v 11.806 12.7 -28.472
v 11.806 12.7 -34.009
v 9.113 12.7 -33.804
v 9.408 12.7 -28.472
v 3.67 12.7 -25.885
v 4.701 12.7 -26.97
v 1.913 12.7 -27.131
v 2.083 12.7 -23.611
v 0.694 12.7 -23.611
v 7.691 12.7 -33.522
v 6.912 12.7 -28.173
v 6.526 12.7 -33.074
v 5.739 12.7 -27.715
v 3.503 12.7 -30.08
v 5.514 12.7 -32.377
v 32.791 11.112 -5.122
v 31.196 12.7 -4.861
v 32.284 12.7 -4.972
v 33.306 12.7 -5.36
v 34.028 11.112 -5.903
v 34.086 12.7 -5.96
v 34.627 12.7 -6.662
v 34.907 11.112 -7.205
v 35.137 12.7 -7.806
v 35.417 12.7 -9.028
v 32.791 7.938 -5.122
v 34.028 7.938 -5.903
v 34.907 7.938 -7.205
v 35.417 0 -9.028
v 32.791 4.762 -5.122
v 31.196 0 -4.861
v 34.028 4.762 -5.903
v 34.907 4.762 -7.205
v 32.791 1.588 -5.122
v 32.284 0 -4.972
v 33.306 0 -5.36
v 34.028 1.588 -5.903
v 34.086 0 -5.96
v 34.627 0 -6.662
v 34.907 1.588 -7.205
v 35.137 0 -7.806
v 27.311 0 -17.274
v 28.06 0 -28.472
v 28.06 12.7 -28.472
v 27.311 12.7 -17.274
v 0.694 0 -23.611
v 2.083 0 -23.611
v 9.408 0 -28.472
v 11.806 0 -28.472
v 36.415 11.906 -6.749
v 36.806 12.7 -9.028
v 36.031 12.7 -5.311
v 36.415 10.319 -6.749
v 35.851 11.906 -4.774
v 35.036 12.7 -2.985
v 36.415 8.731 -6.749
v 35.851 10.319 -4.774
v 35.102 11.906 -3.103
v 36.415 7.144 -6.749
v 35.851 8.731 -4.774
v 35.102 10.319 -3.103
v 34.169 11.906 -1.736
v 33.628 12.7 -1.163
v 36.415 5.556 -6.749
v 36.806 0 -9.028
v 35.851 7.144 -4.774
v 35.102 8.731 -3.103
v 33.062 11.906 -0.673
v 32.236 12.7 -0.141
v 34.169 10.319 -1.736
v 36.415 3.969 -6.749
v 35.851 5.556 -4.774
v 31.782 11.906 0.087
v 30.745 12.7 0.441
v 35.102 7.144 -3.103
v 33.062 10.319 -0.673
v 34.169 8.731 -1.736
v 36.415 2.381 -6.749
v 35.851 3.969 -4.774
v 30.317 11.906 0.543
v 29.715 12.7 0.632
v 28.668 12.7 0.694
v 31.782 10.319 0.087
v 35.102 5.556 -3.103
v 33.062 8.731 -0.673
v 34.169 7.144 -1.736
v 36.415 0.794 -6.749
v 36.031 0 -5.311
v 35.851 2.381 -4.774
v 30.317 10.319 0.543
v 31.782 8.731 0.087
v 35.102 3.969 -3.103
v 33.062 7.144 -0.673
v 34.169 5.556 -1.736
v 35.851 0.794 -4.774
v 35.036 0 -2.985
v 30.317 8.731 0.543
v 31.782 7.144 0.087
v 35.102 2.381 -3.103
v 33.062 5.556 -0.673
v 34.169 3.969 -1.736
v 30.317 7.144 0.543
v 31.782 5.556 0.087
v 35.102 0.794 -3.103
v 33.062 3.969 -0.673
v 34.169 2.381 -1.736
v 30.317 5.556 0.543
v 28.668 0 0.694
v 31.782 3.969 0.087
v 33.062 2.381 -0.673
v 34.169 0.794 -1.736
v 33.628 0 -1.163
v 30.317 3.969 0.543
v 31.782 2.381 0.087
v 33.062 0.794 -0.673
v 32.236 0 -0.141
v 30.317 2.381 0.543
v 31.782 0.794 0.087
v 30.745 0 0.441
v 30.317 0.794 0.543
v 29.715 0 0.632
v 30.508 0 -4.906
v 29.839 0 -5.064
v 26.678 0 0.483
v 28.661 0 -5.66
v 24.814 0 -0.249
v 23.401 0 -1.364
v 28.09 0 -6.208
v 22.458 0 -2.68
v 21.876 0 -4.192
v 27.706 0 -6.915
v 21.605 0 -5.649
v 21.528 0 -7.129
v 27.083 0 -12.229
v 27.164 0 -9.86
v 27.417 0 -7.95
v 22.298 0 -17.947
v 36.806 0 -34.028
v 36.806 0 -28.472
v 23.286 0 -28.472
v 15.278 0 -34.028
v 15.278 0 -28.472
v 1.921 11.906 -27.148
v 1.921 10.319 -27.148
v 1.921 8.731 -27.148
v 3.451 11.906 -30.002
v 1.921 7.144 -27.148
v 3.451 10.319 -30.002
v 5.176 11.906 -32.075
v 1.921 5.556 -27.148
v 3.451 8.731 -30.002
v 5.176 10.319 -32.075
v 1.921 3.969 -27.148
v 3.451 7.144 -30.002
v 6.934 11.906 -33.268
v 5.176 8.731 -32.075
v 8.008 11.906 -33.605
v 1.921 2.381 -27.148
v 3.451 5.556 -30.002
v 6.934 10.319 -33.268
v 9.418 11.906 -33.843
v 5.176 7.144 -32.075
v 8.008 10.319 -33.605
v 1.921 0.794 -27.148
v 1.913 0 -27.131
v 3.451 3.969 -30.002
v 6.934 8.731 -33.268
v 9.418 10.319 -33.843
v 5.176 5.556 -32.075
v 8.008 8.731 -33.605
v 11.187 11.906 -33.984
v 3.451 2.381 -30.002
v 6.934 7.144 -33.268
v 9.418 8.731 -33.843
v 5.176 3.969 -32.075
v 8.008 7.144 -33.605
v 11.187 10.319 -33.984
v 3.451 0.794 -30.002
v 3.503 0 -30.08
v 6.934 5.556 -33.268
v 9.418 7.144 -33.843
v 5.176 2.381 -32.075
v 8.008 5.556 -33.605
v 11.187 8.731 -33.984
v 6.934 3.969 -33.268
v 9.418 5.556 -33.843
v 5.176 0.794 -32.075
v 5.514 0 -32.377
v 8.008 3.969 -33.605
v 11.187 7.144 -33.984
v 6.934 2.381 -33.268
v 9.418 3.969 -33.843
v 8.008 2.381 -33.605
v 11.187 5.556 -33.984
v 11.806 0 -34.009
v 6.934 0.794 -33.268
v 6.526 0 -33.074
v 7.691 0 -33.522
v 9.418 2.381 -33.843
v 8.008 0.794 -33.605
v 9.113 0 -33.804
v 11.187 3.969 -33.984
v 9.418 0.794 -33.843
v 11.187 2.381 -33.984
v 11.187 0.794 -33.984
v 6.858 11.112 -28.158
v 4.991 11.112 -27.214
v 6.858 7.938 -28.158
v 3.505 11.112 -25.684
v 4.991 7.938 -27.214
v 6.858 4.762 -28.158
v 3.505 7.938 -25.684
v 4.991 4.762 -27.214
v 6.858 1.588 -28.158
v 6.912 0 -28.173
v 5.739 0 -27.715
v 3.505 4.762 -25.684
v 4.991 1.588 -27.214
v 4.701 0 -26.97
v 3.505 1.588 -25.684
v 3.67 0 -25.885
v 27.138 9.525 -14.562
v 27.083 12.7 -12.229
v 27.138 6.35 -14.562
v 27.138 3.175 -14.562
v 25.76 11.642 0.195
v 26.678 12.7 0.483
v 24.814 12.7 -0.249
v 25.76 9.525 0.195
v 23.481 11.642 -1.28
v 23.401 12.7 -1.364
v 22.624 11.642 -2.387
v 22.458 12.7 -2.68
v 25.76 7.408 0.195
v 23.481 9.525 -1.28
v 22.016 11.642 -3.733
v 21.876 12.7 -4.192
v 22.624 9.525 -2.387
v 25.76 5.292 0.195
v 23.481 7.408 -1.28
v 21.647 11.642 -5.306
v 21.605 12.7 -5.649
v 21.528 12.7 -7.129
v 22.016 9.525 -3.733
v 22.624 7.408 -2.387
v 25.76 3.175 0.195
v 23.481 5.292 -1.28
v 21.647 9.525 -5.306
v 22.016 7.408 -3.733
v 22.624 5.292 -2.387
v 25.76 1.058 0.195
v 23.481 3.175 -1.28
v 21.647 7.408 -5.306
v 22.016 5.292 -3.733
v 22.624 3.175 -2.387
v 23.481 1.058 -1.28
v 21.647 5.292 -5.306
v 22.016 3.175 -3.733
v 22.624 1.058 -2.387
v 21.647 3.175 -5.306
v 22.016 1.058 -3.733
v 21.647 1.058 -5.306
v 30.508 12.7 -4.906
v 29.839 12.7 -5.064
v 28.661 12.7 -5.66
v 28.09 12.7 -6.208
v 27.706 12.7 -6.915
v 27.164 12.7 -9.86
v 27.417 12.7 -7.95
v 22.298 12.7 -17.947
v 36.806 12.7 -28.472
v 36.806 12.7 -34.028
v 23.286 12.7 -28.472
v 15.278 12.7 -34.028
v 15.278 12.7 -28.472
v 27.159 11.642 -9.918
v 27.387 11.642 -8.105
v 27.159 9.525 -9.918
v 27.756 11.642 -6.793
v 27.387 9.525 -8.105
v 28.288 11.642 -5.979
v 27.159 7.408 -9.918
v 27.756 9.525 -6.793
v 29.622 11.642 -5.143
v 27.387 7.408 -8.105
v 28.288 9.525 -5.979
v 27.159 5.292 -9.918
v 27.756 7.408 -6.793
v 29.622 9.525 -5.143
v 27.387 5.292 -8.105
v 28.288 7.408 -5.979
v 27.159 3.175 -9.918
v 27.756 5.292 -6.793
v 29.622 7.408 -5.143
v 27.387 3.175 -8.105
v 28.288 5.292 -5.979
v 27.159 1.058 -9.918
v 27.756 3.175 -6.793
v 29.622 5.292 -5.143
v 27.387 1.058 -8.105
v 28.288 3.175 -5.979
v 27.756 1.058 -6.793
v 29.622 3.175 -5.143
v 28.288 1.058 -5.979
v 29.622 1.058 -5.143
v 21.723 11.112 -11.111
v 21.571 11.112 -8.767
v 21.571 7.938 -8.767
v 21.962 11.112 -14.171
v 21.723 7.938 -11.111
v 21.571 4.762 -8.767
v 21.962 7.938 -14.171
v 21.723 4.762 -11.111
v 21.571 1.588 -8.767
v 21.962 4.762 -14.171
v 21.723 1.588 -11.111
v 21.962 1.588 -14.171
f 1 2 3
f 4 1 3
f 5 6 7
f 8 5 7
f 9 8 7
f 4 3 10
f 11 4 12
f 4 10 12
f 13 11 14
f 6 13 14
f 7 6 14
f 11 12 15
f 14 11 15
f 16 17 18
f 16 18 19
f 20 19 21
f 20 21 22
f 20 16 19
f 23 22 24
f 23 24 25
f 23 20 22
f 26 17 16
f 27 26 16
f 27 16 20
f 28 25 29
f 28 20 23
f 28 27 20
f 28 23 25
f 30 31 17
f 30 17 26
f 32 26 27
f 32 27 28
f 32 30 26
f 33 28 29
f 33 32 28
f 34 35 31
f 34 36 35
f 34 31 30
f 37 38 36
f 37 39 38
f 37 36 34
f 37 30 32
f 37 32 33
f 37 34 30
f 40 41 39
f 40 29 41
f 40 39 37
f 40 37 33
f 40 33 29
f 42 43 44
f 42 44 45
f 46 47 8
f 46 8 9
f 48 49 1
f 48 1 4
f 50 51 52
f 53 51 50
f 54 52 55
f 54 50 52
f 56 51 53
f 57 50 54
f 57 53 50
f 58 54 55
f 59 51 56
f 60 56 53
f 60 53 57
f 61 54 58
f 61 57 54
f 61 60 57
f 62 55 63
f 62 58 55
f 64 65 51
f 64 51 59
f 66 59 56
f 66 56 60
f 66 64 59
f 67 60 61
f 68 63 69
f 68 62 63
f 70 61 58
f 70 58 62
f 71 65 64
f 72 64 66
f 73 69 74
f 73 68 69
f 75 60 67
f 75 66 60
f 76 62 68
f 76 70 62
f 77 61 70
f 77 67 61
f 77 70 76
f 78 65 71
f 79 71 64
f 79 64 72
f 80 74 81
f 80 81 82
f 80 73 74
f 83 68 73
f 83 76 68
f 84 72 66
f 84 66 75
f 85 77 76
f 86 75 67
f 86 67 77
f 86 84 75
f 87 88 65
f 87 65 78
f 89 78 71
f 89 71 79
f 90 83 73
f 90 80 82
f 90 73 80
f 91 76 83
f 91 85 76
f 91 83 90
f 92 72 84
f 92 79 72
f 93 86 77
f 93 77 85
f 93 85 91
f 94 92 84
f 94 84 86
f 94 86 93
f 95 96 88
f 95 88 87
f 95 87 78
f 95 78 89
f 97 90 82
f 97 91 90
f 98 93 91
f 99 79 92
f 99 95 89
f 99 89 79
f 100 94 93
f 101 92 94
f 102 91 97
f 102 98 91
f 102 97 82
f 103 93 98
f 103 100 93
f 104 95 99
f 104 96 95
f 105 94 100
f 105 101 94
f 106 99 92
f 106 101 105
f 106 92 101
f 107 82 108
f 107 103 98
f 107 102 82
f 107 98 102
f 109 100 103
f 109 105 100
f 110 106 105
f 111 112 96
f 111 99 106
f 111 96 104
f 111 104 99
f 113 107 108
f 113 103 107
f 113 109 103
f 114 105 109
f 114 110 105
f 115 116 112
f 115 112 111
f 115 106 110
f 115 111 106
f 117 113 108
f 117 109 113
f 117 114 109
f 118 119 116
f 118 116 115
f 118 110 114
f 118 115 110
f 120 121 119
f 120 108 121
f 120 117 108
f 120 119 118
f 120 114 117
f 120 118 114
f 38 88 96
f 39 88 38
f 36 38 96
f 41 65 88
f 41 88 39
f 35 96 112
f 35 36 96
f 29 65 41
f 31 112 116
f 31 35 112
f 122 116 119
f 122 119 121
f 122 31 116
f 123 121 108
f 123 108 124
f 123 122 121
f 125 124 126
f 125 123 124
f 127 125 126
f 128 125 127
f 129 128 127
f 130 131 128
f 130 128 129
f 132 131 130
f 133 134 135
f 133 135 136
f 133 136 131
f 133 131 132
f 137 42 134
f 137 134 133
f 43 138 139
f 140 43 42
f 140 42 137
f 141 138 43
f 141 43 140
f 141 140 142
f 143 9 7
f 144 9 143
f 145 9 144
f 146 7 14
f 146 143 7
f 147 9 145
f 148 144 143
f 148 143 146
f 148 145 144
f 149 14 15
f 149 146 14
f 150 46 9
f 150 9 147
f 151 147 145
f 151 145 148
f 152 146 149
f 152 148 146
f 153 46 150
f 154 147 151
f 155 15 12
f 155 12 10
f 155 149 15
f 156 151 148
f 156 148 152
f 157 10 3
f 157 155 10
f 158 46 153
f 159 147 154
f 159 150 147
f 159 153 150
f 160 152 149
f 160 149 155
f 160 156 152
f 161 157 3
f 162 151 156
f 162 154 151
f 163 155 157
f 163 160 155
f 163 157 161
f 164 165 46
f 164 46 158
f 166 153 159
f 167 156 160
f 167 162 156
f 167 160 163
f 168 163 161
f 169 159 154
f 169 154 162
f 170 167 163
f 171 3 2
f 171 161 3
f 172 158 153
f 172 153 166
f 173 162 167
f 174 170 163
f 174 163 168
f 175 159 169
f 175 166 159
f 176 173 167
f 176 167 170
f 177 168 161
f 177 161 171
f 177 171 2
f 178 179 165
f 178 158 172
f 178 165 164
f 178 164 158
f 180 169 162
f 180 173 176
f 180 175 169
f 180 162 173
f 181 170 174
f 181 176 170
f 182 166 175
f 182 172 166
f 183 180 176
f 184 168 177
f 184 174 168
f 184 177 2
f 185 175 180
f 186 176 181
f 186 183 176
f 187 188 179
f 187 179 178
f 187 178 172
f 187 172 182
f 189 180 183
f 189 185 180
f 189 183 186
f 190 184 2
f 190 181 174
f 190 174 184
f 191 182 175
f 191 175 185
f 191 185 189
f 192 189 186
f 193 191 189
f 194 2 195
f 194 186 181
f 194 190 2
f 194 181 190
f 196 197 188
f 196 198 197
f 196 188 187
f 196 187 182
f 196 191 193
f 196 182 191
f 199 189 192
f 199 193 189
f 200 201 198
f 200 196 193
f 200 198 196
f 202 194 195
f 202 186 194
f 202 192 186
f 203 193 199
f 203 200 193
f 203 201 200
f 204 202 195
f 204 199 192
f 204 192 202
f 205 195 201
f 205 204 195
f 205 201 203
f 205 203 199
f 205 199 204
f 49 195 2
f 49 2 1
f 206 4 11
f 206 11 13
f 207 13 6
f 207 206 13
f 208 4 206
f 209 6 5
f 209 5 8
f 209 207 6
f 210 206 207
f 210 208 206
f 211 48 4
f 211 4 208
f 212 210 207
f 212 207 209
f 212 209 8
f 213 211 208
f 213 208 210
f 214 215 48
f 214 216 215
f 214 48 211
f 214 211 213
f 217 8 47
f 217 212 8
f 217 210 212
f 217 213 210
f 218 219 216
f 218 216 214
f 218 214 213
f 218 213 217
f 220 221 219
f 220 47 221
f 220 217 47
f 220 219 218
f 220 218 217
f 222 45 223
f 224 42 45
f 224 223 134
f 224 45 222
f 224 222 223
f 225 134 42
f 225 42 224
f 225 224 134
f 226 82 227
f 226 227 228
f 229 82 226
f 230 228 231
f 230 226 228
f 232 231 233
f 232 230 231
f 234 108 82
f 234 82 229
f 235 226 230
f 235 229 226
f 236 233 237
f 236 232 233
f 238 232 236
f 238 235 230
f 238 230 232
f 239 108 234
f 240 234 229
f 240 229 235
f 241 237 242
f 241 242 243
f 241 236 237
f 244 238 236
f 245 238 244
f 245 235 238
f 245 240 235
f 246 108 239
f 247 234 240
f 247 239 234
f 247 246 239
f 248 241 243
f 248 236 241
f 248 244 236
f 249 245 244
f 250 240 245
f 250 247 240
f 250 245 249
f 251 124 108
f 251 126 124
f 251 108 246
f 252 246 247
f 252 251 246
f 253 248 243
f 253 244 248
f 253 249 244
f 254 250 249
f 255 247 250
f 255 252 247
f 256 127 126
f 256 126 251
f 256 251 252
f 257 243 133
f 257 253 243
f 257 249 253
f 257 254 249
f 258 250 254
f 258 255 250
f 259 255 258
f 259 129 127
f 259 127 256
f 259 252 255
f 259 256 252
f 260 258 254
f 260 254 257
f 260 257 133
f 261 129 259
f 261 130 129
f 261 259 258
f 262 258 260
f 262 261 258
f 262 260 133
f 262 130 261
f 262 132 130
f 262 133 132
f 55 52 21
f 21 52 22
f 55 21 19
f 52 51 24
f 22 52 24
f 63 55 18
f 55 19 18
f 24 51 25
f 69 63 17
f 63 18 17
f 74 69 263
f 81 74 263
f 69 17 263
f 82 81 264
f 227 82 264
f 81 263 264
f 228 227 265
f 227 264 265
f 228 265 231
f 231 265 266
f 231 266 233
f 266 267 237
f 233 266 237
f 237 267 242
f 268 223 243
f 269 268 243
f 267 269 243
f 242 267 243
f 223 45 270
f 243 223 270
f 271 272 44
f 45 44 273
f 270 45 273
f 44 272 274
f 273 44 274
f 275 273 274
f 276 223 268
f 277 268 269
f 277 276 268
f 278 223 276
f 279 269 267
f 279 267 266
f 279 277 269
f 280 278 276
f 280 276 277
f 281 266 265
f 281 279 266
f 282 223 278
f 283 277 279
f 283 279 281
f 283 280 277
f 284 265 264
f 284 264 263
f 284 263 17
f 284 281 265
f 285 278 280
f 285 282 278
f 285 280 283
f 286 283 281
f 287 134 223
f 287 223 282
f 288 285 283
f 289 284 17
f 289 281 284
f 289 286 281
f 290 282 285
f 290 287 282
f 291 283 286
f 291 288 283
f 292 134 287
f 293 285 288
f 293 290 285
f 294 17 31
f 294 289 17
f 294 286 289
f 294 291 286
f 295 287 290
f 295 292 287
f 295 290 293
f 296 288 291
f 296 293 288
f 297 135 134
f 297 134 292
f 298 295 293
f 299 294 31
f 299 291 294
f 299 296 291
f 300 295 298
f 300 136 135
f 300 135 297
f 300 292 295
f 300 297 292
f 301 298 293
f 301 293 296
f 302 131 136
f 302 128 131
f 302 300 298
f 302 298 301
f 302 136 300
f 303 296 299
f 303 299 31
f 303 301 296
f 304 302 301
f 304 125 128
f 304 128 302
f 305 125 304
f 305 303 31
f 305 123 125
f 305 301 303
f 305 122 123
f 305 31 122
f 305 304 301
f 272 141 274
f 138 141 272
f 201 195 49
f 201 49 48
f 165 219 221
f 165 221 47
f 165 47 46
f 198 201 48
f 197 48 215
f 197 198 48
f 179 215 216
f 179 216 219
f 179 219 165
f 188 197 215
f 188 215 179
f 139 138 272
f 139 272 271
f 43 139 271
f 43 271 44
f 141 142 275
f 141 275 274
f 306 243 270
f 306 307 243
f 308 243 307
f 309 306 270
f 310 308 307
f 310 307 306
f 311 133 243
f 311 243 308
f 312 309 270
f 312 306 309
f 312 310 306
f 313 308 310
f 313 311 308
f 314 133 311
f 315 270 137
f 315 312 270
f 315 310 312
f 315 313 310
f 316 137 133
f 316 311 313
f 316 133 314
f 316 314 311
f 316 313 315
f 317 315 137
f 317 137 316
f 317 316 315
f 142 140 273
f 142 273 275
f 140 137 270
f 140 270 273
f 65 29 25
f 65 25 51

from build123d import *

# Parameters (mm, degrees)
BOSS_EXTRUDE1_DEPTH     = 12.7
CUT_EXTRUDE2_DEPTH      = 52.709076543
CUT_EXTRUDE2_DEPTH_BACK = 12.7


with BuildPart() as part:
    # Sketch2 → Boss-Extrude1 (new body)
    with BuildSketch(Plane(origin=(0, 0, 0), x_dir=(1, 0, 0), z_dir=(0, 1, 0))):
        with BuildLine():
            Line((36.805555556, 34.027777778), (36.805555556, 28.472222222))
            Line((36.805555556, 28.472222222), (28.059895833, 28.472222222))
            Line((28.059895833, 28.472222222), (27.311197917, 17.274305556))
            add(Edge.make_bspline(
                [(27.311197917, 17.274305556), (27.277795656, 16.804166639), (27.213581874, 15.900353642), (27.134284285, 14.591279231), (27.088344823, 13.379251723), (27.084956214, 12.601307574), (27.083333333, 12.228732639)],
                knots=[0, 0, 0, 0, 1.119532368, 2.152231754, 3.115062263, 4, 4, 4, 4], degree=3))
            add(Edge.make_bspline(
                [(27.083333333, 12.228732639), (27.088274581, 11.823604319), (27.097676522, 11.052747972), (27.1463749, 9.958919939), (27.245170271, 8.988755862), (27.371002693, 8.143926135), (27.529152233, 7.419430528), (27.728457334, 6.818301639), (27.97650636, 6.339464464), (28.352227221, 5.878445418), (28.902546694, 5.47047021), (29.612022333, 5.12581616), (30.381545964, 4.888099058), (30.919027092, 4.870283408), (31.195746528, 4.861111111)],
                knots=[0, 0, 0, 0, 1.508120221, 2.869569927, 4.073906796, 5.136392291, 6.047624064, 6.831039609, 7.487569696, 8.042672177, 9.031004047, 10.006413578, 10.97361213, 12, 12, 12, 12], degree=3))
            add(Edge.make_bspline(
                [(31.195746528, 4.861111111), (31.47916585, 4.872136088), (32.020929674, 4.893210634), (32.788220791, 5.094099051), (33.466107529, 5.423211567), (34.05259416, 5.891325855), (34.548953998, 6.488400226), (34.936220725, 7.22238631), (35.244986398, 8.076473761), (35.357486114, 8.699850181), (35.416666667, 9.027777778)],
                knots=[0, 0, 0, 0, 1.033647866, 1.975846305, 2.874029418, 3.767535477, 4.696297243, 5.689637366, 6.784632136, 8, 8, 8, 8], degree=3))
            Line((35.416666667, 9.027777778), (36.805555556, 9.027777778))
            add(Edge.make_bspline(
                [(36.805555556, 9.027777778), (36.751313392, 8.636593642), (36.645430641, 7.872987448), (36.430993277, 6.771079076), (36.1666915, 5.743505172), (35.873825885, 4.788096172), (35.503638642, 3.918308722), (35.126438428, 3.108890157), (34.67022236, 2.39005292), (34.190460036, 1.734735752), (33.64770155, 1.167708505), (33.078282467, 0.661363985), (32.447526517, 0.251271838), (31.785619175, -0.107880779), (31.064059185, -0.356214557), (30.308826122, -0.563500536), (29.502063403, -0.664205141), (28.949843487, -0.684214933), (28.667534722, -0.694444444)],
                knots=[0, 0, 0, 0, 1.346490984, 2.628401203, 3.824883511, 4.963792231, 6.031069444, 7.045970716, 8.004214277, 8.929182016, 9.810359102, 10.675861826, 11.520733207, 12.370272421, 13.236390006, 14.115839292, 15.03676947, 16, 16, 16, 16], degree=3))
            add(Edge.make_bspline(
                [(28.667534722, -0.694444444), (28.154682861, -0.675816782), (27.164131243, -0.639838242), (25.766335044, -0.242024901), (24.512145619, 0.369174112), (23.621609051, 1.101026149), (23.010255911, 1.797210882), (22.609852371, 2.383817061), (22.268478936, 3.030858971), (22.003101082, 3.740487332), (21.782965902, 4.501315843), (21.632459475, 5.322642072), (21.547875637, 6.204798769), (21.53462541, 6.814049436), (21.527777778, 7.12890625)],
                knots=[0, 0, 0, 0, 1.53176672, 2.958542455, 4.314758716, 5.68491526, 6.375705814, 7.084681483, 7.806528549, 8.560798466, 9.349284224, 10.175616502, 11.057170379, 12, 12, 12, 12], degree=3))
            add(Edge.make_bspline(
                [(21.527777778, 7.12890625), (21.530511411, 7.37125412), (21.536674087, 7.917600965), (21.569321673, 8.825873224), (21.639359606, 9.910585643), (21.725996598, 11.172904628), (21.834635018, 12.612456183), (21.96658957, 14.232690848), (22.114735136, 16.030968586), (22.235168036, 17.288909187), (22.298177083, 17.947048611)],
                knots=[0, 0, 0, 0, 0.536190643, 1.208783333, 2.010417809, 2.94084931, 4.00811323, 5.204264869, 6.537304937, 8, 8, 8, 8], degree=3))
            Line((22.298177083, 17.947048611), (23.285590278, 28.472222222))
            Line((23.285590278, 28.472222222), (15.277777778, 28.472222222))
            add(Edge.make_bspline(
                [(15.277777778, 28.472222222), (15.214460278, 27.401507925), (15.092072877, 25.331907254), (14.886109564, 22.340596723), (14.670777515, 19.573381685), (14.442846588, 17.030553937), (14.208342944, 14.71137929), (13.954506302, 12.617981517), (13.715610292, 10.74508508), (13.436521107, 9.086740026), (13.164846669, 7.602952782), (12.886850841, 6.270387957), (12.590238795, 5.07441313), (12.303899426, 4.011159992), (12.003972777, 3.085637953), (11.686744628, 2.301603715), (11.378814424, 1.642404725), (10.958043065, 0.964152103), (10.358101863, 0.292051075), (9.505081424, -0.285187523), (8.526340218, -0.641645855), (7.833640049, -0.676470824), (7.476128472, -0.694444444)],
                knots=[0, 0, 0, 0, 2.01044623, 3.886023449, 5.620111306, 7.212895615, 8.671360263, 9.989066837, 11.16552434, 12.209857215, 13.140654073, 13.99296191, 14.760845937, 15.449993852, 16.056713946, 16.582946555, 17.034739681, 17.418487115, 18.076100987, 18.706013306, 19.33215662, 20, 20, 20, 20], degree=3))
            add(Edge.make_bspline(
                [(7.476128472, -0.694444444), (7.207412809, -0.681627697), (6.681489385, -0.656543087), (5.927311086, -0.469815134), (5.234803565, -0.159026243), (4.623769653, 0.271526397), (4.10585267, 0.797998542), (3.737602188, 1.427988796), (3.515453468, 2.133829731), (3.486861324, 2.631486012), (3.472222222, 2.886284722)],
                knots=[0, 0, 0, 0, 1.073515936, 2.101057932, 3.084730514, 4.091615775, 5.073373561, 6.013242394, 6.982785322, 8, 8, 8, 8], degree=3))
            add(Edge.make_bspline(
                [(3.472222222, 2.886284722), (3.49977796, 3.167601475), (3.56174898, 3.800264126), (3.975195909, 4.785596558), (4.58793497, 5.912424554), (5.130000946, 6.671771181), (5.425347222, 7.085503472)],
                knots=[0, 0, 0, 0, 0.719350384, 1.617771125, 2.702035439, 4, 4, 4, 4], degree=3))
            add(Edge.make_bspline(
                [(5.425347222, 7.085503472), (5.880890291, 7.733268934), (6.778468477, 9.009592048), (7.924062056, 11.019134082), (8.912809694, 13.051591024), (9.583491505, 14.814505434), (10.052627408, 16.316401679), (10.355193153, 17.603017915), (10.666713374, 19.033013262), (10.926646603, 20.624922957), (11.194761694, 22.366552488), (11.410609585, 24.268277428), (11.637107009, 26.317618199), (11.748122743, 27.737606389), (11.805555556, 28.472222222)],
                knots=[0, 0, 0, 0, 1.256859471, 2.476450027, 3.668368903, 4.842737386, 5.467680022, 6.165560467, 6.940549266, 7.791280764, 8.726175375, 9.738470097, 10.830021485, 12, 12, 12, 12], degree=3))
            Line((11.805555556, 28.472222222), (9.407552083, 28.472222222))
            add(Edge.make_bspline(
                [(9.407552083, 28.472222222), (8.954085196, 28.460620671), (8.094301289, 28.438623856), (6.890732805, 28.196638527), (5.842130851, 27.81794011), (4.969568852, 27.229936528), (4.197964836, 26.514921386), (3.47646424, 25.663099106), (2.739413588, 24.704465568), (2.307624449, 23.984891132), (2.083333333, 23.611111111)],
                knots=[0, 0, 0, 0, 1.164670171, 2.208242094, 3.144640406, 4.011598175, 4.893941805, 5.843464191, 6.879796223, 8, 8, 8, 8], degree=3))
            Line((2.083333333, 23.611111111), (0.694444444, 23.611111111))
            add(Edge.make_bspline(
                [(0.694444444, 23.611111111), (0.877085401, 24.232597394), (1.229291, 25.431074191), (1.886266978, 27.119888333), (2.60411942, 28.642568556), (3.40397479, 29.980706486), (4.259111756, 31.115981615), (5.118517845, 32.058955597), (5.996672541, 32.785861584), (6.772590288, 33.224850634), (7.449074281, 33.455523285), (8.027104125, 33.619326955), (8.696031334, 33.743397524), (9.444623844, 33.855790163), (10.28602055, 33.921881494), (11.211287579, 33.993942488), (12.22496831, 34.020966417), (12.926797761, 34.025446099), (13.292100694, 34.027777778)],
                knots=[0, 0, 0, 0, 1.702237036, 3.282601159, 4.758360036, 6.123233304, 7.372634412, 8.489452943, 9.469553166, 10.358928799, 10.813046741, 11.345939706, 11.937066667, 12.599998432, 13.335161994, 14.154869419, 15.039607681, 16, 16, 16, 16], degree=3))
            Line((13.292100694, 34.027777778), (36.805555556, 34.027777778))
        make_face()
    extrude(amount=BOSS_EXTRUDE1_DEPTH)

    # Sketch3 → Cut-Extrude2 (cut, two sides: drawn at the far end of the back side and taken through both)
    with BuildSketch(Plane(origin=(0, 12.7, 0), x_dir=(1, 0, 0), z_dir=(0, 1, 0)).offset(-CUT_EXTRUDE2_DEPTH_BACK)):
        with BuildLine():
            Line((11.805555556, 28.472222222), (15.277777778, 28.472222222))
            add(Edge.make_bspline(
                [(7.476128472, -0.694444444), (7.833640049, -0.676470824), (8.526340218, -0.641645855), (9.505081424, -0.285187523), (10.358101863, 0.292051075), (10.958043065, 0.964152103), (11.378814424, 1.642404725), (11.686744628, 2.301603715), (12.003972777, 3.085637953), (12.303899426, 4.011159992), (12.590238795, 5.07441313), (12.886850841, 6.270387957), (13.164846669, 7.602952782), (13.436521107, 9.086740026), (13.715610292, 10.74508508), (13.954506302, 12.617981517), (14.208342944, 14.71137929), (14.442846588, 17.030553937), (14.670777515, 19.573381685), (14.886109564, 22.340596723), (15.092072877, 25.331907254), (15.214460278, 27.401507925), (15.277777778, 28.472222222)],
                knots=[0, 0, 0, 0, 0.033392169, 0.064699335, 0.096194951, 0.129075644, 0.148263016, 0.170852672, 0.197164303, 0.227500307, 0.261957703, 0.300351905, 0.342967296, 0.389507139, 0.441723783, 0.500546658, 0.566431987, 0.639355219, 0.718994435, 0.805698828, 0.899477689, 1, 1, 1, 1], degree=3))
            add(Edge.make_bspline(
                [(3.472222222, 2.886284722), (3.486861324, 2.631486012), (3.515453468, 2.133829731), (3.737602188, 1.427988796), (4.10585267, 0.797998542), (4.623769653, 0.271526397), (5.234803565, -0.159026243), (5.927311086, -0.469815134), (6.681489385, -0.656543087), (7.207412809, -0.681627697), (7.476128472, -0.694444444)],
                knots=[0, 0, 0, 0, 0.127151835, 0.248344701, 0.365828305, 0.488548028, 0.614408686, 0.737367758, 0.865810508, 1, 1, 1, 1], degree=3))
            add(Edge.make_bspline(
                [(5.425347222, 7.085503472), (5.130000946, 6.671771181), (4.58793497, 5.912424554), (3.975195909, 4.785596558), (3.56174898, 3.800264126), (3.49977796, 3.167601475), (3.472222222, 2.886284722)],
                knots=[0, 0, 0, 0, 0.32449114, 0.595557219, 0.820162404, 1, 1, 1, 1], degree=3))
            add(Edge.make_bspline(
                [(11.805555556, 28.472222222), (11.748122743, 27.737606389), (11.637107009, 26.317618199), (11.410609585, 24.268277428), (11.194761694, 22.366552488), (10.926646603, 20.624922957), (10.666713374, 19.033013262), (10.355193153, 17.603017915), (10.052627408, 16.316401679), (9.583491505, 14.814505434), (8.912809694, 13.051591024), (7.924062056, 11.019134082), (6.778468477, 9.009592048), (5.880890291, 7.733268934), (5.425347222, 7.085503472)],
                knots=[0, 0, 0, 0, 0.09749821, 0.188460825, 0.272818719, 0.350726603, 0.421620894, 0.486203294, 0.544359998, 0.596438551, 0.694302591, 0.793629164, 0.895261711, 1, 1, 1, 1], degree=3))
        make_face()
        with BuildLine():
            Line((11.805555556, 34.00851445), (11.805555556, 28.472222222))
            Line((11.805555556, 28.472222222), (15.277777778, 28.472222222))
            Line((15.277777778, 28.472222222), (15.277777778, 34.027777778))
            Line((15.277777778, 34.027777778), (13.292100694, 34.027777778))
            add(Edge.make_bspline(
                [(13.292100694, 34.027777778), (12.926797761, 34.025446099), (12.431281834, 34.022283288), (11.935745047, 34.012026213), (11.805555556, 34.00851445)],
                knots=[0, 0, 0, 0, 0.06002452, 0.081420385, 0.081420385, 0.081420385, 0.081420385], degree=3))
        make_face()
    extrude(amount=CUT_EXTRUDE2_DEPTH + CUT_EXTRUDE2_DEPTH_BACK, mode=Mode.SUBTRACT)


with BuildPart() as cut_extrude2_piece_1:
    # of the separate pieces the step leaves, piece 1, a body of its own (cut_extrude2_pieces)
    add(part.part.solids().sort_by_distance((36.805555556, 0, -34.027777778))[0])


with BuildPart() as cut_extrude2_piece_2:
    # of the separate pieces the step leaves, piece 2, a body of its own (cut_extrude2_pieces)
    add(part.part.solids().sort_by_distance((0.694444444, 0, -23.611111111))[0])


solid = Compound([cut_extrude2_piece_1.part, cut_extrude2_piece_2.part])
